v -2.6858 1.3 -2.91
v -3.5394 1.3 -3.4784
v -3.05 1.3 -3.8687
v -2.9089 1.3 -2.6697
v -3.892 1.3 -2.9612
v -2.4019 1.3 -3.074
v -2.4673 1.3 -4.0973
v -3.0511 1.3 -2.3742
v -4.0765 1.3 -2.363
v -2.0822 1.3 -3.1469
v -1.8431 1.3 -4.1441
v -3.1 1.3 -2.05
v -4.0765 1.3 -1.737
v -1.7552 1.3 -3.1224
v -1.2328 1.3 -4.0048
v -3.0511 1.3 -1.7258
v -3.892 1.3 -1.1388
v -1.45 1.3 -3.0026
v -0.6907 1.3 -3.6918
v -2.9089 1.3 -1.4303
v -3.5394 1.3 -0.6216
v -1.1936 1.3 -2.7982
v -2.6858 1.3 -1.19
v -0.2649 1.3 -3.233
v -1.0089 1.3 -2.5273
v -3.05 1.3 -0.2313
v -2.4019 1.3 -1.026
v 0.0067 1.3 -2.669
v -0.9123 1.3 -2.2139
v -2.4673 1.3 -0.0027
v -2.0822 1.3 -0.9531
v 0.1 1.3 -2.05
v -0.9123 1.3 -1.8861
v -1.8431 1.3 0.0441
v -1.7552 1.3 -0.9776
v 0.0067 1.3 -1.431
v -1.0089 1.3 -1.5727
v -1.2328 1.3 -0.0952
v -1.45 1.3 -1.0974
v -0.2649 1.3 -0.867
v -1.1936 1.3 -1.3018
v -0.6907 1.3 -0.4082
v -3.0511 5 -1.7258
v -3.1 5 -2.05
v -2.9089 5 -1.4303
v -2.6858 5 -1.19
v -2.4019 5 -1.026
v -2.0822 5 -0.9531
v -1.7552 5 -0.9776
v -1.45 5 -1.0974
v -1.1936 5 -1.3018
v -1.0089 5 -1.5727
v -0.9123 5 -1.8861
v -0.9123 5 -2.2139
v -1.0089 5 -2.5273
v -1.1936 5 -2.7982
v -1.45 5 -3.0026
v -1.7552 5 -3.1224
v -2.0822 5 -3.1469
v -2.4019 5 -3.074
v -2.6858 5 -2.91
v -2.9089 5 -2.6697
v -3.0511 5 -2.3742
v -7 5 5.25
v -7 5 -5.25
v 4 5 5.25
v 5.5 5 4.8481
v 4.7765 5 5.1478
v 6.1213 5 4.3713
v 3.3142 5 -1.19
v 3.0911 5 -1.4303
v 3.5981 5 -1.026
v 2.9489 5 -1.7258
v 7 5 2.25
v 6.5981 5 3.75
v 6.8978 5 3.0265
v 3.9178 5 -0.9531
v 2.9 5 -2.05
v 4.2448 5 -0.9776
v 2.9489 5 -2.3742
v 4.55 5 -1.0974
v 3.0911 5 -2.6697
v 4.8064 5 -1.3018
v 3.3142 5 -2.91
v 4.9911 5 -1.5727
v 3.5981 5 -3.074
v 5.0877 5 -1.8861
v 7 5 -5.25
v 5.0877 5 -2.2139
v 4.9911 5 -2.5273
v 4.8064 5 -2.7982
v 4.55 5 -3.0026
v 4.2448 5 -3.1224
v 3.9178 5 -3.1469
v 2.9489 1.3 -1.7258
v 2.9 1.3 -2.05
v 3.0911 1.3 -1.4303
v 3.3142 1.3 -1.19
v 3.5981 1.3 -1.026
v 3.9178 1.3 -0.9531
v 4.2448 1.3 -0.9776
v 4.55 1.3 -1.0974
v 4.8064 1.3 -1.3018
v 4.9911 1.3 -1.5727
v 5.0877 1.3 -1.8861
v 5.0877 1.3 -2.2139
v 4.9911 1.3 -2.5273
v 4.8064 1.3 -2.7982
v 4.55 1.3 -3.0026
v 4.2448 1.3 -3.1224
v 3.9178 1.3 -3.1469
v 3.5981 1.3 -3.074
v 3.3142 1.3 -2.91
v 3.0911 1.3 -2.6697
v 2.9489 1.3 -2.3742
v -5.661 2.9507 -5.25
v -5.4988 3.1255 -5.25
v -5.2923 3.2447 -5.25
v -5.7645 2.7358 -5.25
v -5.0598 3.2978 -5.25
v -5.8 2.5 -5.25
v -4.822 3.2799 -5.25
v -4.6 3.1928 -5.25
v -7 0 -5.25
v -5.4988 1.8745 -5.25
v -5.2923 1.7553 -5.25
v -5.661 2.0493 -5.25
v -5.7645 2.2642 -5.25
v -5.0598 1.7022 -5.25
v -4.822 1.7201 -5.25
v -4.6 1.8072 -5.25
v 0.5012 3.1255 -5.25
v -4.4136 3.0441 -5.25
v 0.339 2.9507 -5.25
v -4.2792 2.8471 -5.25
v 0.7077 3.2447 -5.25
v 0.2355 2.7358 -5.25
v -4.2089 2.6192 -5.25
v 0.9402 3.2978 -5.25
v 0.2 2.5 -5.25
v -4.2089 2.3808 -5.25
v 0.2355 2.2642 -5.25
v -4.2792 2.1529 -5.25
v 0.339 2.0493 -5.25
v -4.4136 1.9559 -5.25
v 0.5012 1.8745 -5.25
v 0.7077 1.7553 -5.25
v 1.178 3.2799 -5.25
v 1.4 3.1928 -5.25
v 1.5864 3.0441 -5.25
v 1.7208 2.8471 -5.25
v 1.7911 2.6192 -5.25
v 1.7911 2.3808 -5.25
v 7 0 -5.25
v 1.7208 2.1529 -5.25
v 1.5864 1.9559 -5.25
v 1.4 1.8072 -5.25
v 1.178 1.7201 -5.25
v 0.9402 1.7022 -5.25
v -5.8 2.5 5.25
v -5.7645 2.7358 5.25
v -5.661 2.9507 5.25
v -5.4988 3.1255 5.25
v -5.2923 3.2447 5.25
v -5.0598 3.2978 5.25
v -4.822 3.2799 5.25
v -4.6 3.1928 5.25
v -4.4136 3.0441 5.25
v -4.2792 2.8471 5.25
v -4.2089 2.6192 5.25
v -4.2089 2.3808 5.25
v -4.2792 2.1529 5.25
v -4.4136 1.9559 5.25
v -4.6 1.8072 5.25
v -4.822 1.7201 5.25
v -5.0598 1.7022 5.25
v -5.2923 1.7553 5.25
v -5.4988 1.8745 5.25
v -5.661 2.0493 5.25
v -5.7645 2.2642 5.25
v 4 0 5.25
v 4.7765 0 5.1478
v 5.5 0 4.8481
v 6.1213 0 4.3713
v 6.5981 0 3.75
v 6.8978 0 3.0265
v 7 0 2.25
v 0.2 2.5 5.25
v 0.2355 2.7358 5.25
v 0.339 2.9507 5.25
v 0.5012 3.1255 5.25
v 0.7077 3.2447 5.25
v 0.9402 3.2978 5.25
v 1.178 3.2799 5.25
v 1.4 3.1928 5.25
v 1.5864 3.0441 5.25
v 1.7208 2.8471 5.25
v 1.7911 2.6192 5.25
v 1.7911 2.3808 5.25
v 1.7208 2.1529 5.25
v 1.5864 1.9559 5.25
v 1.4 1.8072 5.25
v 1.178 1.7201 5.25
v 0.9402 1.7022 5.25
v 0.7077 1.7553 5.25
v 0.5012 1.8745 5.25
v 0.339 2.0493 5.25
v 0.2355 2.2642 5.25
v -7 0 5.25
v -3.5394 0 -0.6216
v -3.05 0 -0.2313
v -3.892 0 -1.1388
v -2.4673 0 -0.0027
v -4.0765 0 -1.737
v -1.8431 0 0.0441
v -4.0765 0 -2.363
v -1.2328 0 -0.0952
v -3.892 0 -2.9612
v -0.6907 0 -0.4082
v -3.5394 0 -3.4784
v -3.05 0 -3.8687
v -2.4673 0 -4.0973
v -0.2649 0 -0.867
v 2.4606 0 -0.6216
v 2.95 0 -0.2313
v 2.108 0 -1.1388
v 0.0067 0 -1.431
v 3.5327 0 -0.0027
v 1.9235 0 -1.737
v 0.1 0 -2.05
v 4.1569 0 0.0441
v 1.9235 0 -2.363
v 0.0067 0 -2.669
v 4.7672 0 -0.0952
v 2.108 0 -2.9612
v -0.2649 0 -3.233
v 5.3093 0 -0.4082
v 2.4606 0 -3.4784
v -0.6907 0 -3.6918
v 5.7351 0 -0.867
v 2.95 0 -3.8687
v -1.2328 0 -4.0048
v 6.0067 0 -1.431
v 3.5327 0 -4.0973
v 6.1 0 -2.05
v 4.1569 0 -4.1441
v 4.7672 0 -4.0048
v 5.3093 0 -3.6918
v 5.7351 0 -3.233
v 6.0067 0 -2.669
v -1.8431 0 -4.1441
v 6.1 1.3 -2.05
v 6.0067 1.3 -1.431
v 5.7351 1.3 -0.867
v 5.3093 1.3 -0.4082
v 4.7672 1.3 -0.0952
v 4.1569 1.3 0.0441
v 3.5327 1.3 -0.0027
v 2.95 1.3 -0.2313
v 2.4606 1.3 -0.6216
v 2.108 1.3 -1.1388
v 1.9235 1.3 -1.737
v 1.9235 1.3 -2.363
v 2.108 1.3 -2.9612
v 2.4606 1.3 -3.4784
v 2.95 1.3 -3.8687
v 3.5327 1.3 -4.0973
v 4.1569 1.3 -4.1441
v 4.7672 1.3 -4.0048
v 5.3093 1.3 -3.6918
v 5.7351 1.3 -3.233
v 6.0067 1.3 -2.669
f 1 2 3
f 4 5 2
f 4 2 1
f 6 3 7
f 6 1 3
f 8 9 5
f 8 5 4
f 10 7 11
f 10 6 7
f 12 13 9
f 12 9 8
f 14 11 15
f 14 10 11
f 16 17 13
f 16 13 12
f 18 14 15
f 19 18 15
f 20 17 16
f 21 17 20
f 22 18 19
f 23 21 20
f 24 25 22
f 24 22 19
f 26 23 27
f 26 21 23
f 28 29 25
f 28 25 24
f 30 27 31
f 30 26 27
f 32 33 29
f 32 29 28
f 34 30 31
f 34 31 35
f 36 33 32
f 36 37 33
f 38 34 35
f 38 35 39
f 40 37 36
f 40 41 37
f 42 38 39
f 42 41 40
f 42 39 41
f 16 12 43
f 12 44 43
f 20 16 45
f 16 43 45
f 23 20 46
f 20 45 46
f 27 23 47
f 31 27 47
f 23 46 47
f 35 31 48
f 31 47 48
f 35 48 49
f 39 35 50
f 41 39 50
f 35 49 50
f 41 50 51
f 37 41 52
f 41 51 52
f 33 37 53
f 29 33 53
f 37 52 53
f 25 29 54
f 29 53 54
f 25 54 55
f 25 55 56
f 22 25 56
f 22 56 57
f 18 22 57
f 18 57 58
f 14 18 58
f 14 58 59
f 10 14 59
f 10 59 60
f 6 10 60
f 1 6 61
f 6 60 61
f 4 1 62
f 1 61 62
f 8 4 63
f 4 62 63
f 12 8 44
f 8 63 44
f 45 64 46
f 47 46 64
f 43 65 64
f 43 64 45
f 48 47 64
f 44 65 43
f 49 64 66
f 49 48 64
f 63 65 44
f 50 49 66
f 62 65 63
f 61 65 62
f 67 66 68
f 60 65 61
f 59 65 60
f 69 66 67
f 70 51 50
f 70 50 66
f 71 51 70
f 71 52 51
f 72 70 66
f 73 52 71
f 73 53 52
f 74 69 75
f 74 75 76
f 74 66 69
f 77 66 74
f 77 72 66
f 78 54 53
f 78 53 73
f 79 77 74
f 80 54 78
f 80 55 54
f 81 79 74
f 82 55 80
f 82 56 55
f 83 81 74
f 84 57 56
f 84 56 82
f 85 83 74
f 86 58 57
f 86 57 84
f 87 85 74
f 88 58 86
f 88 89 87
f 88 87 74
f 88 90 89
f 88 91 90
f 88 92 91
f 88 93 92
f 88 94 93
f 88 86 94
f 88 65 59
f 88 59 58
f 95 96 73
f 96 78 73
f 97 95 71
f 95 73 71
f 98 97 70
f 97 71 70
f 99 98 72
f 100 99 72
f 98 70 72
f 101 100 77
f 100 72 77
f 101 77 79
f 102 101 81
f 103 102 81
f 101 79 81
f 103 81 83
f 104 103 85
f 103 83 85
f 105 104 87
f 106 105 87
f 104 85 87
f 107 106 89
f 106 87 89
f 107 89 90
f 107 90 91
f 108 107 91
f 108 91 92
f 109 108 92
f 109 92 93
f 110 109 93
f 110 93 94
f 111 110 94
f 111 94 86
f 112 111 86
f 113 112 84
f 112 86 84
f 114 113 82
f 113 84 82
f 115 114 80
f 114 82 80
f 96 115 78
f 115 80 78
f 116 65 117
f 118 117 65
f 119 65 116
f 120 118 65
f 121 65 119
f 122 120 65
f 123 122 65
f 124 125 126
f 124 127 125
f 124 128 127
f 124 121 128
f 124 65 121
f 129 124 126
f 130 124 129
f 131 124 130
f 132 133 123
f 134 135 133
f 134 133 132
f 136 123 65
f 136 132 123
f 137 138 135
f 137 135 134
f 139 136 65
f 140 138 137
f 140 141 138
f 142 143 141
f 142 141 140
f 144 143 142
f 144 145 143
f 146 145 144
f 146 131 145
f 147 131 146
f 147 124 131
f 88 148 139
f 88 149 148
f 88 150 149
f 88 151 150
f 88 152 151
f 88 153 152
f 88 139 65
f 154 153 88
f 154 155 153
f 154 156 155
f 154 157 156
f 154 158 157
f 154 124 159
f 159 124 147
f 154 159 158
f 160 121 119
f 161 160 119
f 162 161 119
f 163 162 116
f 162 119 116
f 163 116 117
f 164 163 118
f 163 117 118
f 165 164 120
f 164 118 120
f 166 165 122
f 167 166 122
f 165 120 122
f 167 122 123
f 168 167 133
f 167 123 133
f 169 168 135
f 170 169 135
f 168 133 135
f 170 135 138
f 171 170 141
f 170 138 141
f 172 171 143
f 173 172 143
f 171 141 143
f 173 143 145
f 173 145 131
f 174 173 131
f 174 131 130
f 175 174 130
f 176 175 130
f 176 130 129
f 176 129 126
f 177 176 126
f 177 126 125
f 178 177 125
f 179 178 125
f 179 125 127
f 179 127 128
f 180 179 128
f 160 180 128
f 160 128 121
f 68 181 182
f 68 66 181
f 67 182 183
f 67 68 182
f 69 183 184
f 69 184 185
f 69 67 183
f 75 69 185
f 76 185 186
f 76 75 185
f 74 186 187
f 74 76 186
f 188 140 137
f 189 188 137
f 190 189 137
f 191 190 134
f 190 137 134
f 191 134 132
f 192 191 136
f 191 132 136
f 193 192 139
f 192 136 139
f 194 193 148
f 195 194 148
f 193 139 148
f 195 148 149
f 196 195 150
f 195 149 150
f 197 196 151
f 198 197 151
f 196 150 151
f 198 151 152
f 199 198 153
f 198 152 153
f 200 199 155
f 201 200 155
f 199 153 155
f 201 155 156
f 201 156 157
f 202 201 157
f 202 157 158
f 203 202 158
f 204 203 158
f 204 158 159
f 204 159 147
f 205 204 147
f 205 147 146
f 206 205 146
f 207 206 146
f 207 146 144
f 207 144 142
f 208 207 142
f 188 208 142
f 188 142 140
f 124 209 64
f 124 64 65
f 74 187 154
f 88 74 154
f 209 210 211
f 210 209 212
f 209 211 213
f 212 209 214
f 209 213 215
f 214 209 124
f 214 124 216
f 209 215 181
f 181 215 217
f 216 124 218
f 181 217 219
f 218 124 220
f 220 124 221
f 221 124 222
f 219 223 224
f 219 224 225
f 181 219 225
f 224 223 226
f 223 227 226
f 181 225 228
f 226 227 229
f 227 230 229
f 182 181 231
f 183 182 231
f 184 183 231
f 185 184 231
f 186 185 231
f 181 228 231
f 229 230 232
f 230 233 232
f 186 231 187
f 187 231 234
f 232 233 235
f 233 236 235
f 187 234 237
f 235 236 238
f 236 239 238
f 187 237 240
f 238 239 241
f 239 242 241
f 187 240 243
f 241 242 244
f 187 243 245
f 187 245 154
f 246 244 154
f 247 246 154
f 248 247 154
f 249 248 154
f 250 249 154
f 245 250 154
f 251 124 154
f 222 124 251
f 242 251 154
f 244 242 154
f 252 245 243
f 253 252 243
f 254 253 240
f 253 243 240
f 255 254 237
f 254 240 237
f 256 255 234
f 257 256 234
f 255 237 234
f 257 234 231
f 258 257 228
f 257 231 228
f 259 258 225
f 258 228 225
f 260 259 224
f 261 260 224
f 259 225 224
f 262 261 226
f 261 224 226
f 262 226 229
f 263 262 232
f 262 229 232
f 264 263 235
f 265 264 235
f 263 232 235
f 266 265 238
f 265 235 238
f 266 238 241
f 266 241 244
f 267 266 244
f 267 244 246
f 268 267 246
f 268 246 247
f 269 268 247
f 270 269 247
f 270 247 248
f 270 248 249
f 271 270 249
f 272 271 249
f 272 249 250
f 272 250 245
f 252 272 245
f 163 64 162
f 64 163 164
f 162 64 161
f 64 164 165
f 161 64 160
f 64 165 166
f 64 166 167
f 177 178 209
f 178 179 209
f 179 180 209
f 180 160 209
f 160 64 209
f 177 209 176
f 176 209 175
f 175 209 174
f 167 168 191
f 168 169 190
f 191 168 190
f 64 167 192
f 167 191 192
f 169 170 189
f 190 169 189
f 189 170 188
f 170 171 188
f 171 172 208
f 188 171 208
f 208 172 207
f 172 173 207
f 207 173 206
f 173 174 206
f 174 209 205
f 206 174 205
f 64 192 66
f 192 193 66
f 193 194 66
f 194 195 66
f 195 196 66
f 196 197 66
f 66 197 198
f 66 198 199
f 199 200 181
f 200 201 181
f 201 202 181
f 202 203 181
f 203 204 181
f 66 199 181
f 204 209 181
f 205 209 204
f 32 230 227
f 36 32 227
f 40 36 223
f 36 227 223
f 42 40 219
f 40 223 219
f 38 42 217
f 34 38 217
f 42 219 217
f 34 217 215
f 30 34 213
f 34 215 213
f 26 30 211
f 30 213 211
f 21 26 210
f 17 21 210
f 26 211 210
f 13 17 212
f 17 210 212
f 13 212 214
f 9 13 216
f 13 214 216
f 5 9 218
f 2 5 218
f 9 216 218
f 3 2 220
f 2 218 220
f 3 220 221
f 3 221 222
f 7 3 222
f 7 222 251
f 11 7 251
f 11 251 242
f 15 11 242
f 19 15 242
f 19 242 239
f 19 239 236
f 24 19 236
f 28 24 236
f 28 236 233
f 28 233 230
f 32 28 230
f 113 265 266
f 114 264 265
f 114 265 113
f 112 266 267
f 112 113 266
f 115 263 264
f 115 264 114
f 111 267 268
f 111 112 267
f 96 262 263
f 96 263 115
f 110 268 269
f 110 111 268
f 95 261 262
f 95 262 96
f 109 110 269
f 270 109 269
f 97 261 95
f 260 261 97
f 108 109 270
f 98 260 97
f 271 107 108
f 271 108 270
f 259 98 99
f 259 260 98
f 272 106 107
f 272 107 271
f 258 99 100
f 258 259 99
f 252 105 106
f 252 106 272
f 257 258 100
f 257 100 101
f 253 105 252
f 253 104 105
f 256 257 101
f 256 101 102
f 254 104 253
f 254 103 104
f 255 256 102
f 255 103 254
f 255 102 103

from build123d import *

# Parameters (mm, degrees)
SKETCH1_W           = 14
SKETCH1_H           = 10.5
BOSS_EXTRUDE1_DEPTH = 5
HOLE1_D             = 2.2
HOLE1_CBORE_D       = 4.2
HOLE1_CBORE_DEPTH   = 1.3
FILLET_2_R          = 3
M2X0_4_5_D          = 1.6


with BuildPart() as part:
    # Sketch1 → Boss-Extrude1 (new body)
    with BuildSketch(Plane(origin=(0, 0, 0), x_dir=(1, 0, 0), z_dir=(0, 1, 0))):
        Rectangle(SKETCH1_W, SKETCH1_H)
    extrude(amount=BOSS_EXTRUDE1_DEPTH)

    # Hole1 (through all)
    with Locations(Plane.XZ):
        with Locations((-2, -2.05), (4, -2.05)):
            CounterBoreHole(HOLE1_D / 2, HOLE1_CBORE_D / 2, HOLE1_CBORE_DEPTH)

    # ﾌｨﾚｯﾄ2
    fillet_2_edges = [part.edges().sort_by_distance(p)[0] for p in [
        (7, 2.5, 5.25),
    ]]
    fillet(fillet_2_edges, radius=FILLET_2_R)

    # M2x0.4 ねじ穴5 (through all)
    with Locations(Plane(origin=(-5, 2.5, 5.25), x_dir=(1, 0, 0), z_dir=(0, 0, 1))):
        with Locations((0, 0), (6, 0)):
            Hole(M2X0_4_5_D / 2)


solid = part.part
